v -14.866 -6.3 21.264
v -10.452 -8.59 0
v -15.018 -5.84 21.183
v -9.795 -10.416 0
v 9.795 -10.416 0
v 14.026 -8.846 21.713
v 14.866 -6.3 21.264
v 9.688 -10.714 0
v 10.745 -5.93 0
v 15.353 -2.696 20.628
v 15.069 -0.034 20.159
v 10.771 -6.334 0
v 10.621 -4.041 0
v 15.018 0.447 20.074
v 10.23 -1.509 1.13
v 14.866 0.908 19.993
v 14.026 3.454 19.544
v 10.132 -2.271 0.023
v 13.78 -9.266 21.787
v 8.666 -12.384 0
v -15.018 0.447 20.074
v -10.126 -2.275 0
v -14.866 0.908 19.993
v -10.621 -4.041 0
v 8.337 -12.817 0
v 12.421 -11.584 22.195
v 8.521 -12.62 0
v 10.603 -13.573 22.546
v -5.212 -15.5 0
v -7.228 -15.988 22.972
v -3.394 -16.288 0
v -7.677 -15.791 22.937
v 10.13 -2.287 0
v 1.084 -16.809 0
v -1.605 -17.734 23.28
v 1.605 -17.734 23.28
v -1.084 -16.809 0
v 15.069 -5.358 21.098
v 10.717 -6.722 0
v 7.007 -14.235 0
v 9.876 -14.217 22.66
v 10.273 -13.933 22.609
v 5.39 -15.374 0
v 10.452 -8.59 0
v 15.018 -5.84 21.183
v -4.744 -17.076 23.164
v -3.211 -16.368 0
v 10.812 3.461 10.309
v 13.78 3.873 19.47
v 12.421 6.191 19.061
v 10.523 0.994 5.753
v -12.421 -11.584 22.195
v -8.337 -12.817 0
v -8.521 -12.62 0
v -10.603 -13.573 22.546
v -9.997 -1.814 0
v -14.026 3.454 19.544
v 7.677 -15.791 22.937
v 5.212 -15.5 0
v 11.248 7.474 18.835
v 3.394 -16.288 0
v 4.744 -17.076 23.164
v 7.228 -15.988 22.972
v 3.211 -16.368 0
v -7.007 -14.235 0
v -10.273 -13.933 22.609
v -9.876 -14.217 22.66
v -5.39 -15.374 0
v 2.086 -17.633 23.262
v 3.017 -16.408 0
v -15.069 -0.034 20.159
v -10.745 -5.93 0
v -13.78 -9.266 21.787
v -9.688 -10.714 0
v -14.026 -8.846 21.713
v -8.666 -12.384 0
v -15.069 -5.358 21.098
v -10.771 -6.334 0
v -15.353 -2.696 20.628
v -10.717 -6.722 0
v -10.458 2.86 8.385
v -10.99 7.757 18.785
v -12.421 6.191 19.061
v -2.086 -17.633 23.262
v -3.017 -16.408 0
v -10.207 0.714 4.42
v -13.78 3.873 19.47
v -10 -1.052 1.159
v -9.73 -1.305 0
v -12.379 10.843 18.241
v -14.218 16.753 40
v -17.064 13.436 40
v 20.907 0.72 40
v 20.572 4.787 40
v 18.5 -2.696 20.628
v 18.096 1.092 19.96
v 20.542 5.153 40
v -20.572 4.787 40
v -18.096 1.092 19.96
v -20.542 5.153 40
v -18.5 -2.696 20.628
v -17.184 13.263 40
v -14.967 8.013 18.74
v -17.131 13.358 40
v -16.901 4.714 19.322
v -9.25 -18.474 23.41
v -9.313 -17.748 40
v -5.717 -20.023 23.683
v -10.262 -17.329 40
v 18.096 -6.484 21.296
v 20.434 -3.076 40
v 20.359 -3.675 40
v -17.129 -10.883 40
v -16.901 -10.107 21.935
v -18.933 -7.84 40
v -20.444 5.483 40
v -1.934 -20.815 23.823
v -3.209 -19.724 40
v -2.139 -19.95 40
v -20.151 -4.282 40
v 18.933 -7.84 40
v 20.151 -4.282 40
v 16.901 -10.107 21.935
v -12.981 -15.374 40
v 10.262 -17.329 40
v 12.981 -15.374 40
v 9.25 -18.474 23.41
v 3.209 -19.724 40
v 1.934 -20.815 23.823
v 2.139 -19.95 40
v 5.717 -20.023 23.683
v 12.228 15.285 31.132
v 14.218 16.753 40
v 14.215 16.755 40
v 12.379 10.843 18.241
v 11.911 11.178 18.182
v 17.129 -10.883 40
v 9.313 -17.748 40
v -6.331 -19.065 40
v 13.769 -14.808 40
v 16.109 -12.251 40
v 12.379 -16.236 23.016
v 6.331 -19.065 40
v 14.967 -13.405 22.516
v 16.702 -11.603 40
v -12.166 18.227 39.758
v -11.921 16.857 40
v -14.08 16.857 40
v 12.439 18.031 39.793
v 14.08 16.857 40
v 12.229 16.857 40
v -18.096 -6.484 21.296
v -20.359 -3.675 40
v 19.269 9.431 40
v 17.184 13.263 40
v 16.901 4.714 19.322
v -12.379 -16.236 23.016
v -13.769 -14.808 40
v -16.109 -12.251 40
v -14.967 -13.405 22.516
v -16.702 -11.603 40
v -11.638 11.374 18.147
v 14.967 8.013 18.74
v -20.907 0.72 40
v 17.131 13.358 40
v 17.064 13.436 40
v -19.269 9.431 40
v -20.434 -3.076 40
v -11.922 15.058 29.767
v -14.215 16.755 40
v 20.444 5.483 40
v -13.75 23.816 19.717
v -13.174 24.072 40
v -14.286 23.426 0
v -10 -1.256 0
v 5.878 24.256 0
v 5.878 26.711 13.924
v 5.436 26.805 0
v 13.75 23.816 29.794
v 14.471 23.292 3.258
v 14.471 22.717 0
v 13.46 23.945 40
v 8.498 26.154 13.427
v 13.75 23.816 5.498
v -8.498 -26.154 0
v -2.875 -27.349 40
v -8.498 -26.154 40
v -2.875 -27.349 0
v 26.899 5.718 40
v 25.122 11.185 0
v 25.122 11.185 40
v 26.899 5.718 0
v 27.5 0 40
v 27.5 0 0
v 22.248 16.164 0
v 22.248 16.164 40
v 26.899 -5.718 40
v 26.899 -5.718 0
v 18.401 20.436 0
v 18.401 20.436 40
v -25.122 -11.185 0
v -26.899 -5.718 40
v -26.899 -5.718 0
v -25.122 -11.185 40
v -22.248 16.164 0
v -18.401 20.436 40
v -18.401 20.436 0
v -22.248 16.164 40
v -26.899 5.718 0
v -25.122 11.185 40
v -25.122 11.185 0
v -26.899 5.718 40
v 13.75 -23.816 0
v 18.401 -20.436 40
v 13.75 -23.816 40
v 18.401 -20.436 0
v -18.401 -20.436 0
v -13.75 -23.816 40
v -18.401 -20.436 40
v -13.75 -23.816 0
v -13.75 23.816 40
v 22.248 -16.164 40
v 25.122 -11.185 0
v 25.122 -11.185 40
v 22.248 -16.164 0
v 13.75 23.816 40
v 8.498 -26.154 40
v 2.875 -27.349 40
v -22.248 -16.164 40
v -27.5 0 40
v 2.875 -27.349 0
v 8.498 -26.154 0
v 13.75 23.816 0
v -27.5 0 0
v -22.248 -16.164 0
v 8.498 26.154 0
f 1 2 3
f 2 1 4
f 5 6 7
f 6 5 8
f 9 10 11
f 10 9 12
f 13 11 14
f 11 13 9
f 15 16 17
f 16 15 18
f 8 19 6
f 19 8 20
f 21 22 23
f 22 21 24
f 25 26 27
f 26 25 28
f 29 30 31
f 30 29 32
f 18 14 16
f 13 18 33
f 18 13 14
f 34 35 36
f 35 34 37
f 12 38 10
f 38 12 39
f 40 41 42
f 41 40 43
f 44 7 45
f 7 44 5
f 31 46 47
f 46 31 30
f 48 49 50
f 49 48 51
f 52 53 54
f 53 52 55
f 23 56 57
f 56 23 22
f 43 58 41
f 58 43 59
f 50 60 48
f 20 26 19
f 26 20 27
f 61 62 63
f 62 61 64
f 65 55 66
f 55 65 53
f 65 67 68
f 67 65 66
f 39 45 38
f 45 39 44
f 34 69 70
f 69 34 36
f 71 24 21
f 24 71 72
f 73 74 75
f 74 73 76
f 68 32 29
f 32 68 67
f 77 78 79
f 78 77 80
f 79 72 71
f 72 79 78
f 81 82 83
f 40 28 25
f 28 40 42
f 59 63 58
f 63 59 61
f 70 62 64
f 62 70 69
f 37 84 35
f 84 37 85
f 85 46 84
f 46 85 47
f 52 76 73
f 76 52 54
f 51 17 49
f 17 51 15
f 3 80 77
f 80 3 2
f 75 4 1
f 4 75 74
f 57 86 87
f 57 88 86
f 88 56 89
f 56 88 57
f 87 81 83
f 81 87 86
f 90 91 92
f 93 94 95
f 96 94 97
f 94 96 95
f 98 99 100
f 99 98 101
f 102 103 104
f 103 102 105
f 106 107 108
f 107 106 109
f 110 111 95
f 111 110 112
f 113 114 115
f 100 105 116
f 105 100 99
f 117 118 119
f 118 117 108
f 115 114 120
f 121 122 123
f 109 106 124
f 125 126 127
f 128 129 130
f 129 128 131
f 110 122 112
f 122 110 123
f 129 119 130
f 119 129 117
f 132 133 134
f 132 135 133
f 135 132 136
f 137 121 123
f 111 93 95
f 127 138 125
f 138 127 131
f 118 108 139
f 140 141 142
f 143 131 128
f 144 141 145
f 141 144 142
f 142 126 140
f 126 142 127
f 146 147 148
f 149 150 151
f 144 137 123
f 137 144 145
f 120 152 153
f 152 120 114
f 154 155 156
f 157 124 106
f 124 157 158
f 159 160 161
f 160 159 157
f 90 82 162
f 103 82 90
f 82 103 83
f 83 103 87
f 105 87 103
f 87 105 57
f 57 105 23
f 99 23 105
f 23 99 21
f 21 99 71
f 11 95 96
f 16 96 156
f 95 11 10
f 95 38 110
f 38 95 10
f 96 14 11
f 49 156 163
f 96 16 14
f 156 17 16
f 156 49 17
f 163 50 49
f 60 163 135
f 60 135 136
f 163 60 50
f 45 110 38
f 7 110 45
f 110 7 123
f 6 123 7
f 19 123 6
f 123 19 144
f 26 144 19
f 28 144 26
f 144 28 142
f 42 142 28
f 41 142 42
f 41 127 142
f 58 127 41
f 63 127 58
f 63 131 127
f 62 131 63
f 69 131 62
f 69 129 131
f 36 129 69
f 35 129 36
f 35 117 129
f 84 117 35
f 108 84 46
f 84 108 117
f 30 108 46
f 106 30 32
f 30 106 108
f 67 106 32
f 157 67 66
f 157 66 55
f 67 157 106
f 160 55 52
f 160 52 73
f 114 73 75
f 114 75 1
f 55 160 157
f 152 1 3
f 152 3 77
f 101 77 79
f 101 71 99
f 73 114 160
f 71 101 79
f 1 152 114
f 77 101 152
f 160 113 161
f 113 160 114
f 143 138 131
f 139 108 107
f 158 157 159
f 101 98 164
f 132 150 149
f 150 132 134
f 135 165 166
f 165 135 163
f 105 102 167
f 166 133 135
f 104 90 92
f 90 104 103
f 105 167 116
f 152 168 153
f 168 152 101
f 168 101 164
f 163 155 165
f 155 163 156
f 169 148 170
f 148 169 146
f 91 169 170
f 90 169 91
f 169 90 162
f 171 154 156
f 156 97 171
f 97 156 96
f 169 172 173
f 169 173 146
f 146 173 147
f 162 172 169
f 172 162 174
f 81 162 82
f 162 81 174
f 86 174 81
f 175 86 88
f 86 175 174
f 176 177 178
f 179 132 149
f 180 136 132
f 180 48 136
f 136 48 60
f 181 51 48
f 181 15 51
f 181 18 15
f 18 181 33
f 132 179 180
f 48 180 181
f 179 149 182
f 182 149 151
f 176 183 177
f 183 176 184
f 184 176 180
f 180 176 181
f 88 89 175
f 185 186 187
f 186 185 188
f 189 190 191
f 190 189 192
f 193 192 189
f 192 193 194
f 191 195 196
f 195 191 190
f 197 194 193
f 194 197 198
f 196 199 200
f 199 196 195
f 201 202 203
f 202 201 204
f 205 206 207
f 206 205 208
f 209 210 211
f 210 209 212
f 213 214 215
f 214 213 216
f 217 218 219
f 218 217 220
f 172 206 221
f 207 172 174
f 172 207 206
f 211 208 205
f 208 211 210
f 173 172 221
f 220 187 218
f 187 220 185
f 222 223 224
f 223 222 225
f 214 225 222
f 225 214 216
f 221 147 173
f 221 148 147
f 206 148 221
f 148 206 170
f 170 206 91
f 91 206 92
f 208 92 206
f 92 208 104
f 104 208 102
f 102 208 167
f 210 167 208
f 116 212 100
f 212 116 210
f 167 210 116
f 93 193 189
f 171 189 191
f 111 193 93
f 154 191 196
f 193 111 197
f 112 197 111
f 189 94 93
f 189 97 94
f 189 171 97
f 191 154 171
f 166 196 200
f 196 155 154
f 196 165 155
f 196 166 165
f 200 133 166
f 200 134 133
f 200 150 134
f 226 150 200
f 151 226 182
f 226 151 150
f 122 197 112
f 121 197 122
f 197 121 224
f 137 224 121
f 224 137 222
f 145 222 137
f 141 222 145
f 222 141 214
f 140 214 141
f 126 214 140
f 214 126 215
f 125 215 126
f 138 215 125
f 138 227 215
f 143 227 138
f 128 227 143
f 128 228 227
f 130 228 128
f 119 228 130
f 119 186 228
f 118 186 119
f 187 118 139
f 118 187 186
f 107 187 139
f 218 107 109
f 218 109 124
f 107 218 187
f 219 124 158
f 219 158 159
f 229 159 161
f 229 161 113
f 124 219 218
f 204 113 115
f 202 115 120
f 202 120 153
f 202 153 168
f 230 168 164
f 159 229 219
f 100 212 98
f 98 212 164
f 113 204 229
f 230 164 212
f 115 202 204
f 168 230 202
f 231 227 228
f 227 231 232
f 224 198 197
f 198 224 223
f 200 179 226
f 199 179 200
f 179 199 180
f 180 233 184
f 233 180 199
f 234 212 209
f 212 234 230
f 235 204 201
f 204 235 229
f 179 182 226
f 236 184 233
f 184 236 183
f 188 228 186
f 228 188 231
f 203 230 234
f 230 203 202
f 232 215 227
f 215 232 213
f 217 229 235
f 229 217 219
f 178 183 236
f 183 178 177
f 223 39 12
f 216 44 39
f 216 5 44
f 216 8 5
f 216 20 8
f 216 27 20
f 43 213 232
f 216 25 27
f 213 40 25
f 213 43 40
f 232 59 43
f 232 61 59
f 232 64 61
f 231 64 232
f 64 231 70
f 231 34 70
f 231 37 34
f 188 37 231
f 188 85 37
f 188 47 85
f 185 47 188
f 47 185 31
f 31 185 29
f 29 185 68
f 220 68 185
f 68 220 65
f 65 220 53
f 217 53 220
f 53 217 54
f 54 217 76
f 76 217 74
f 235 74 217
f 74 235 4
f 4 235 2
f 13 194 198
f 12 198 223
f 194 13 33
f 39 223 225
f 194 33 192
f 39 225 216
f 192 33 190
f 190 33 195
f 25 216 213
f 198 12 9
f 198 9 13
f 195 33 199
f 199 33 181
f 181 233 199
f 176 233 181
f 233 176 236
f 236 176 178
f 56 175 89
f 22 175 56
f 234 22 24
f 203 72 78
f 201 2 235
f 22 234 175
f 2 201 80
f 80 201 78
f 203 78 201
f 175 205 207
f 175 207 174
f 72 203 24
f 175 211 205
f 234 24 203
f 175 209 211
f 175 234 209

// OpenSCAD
epsilon = 0.01; epsilo2 = epsilon*2;

base_width = 60;
base_length = 90;
base_height = 4;
neck_width = 25;  // neck is the 'centre' of the narrowing up to the holder
neck_length = 40;
neck_height = 20;



neck_rad = (neck_height - base_height);
neck_wid_off = (base_width - neck_width) / 2 - neck_rad;
neck_wid_fof = base_width - neck_wid_off;
neck_len_off = (base_length - neck_length) / 2 - neck_rad;
neck_len_fof = base_length - neck_len_off;
echo("neck_rad", neck_rad, "neck_wid_off", neck_wid_off);

* difference() {
    union() {
        // the base, up to the centre neck
        cube([base_width, base_length, neck_height]);
        translate([(base_width-neck_width)/2, -5, 0]) cube([neck_width, 1, 1]);
    }
    union() {
        translate([neck_wid_off, -epsilon, neck_height]) 
          rotate([-90, 0, 0]) cylinder(h=base_length + epsilo2, r=neck_rad);
        translate([neck_wid_fof, -epsilon, neck_height]) 
          rotate([-90, 0, 0]) cylinder(h=base_length + epsilo2, r=neck_rad);
        if (neck_wid_off>0) { union() {
            translate([-epsilon, -epsilon, base_height])
              cube([neck_wid_off, base_length + epsilo2, neck_rad]); 
            translate([neck_wid_fof, -epsilon, base_height])
              cube([neck_wid_off+epsilon, base_length + epsilo2, neck_rad]); 
        } }
        translate([-epsilon, neck_len_off, neck_height])
          rotate([0, 90, 0]) cylinder(h=base_width + epsilo2, r=neck_rad);
        translate([-epsilon, neck_len_fof, neck_height])
          rotate([0, 90, 0]) cylinder(h=base_width + epsilo2, r=neck_rad);
        if (neck_len_off>0) { union() {
            translate([-epsilon, -epsilon, base_height])
              cube([base_width + epsilo2, neck_len_off, neck_rad]); 
            translate([-epsilon, neck_len_fof, base_height])
              cube([base_width + epsilo2, neck_len_off+epsilon, neck_rad]); 
        } }
    }
}

holder_outer_bot_d = 55;
holder_outer_top_d = 55;
holder_height = 40;
holder_inner1_bot_d = 20; holder_inner1_bot_r = holder_inner1_bot_d/2;
holder_inner1_top_d = 34;
holder_inner1_height= 32;
holder_inner2_bot_d = 37;
holder_inner2_top_d = 42.5;
holder_inner2_height= 19;
holder_inner_angle = 10;
holder_inner_z_off = holder_height*sin(holder_inner_angle);
holder_inner_epsilon = holder_inner1_bot_d*sin(holder_inner_angle);
holder_throat_1_angle = 10;  // based as an offset from holder_inner1_bot_d;
holder_throat_2_angle = 15;
holder_throat_2_offset = 10;

difference() {
    cylinder(h=holder_height, d1=holder_outer_bot_d, d2=holder_outer_top_d);
    translate([0, -holder_inner_z_off, -holder_inner_epsilon]) 
      rotate([-holder_inner_angle, 0, 0]) union() {
        // The cones to make up the holder
        translate([0, 0, 0]) cylinder(
          h=holder_inner1_height, d1=holder_inner1_bot_d, d2=holder_inner1_top_d
        );
        translate([0, 0, holder_height-holder_inner2_height+holder_inner_epsilon]) cylinder(
          h=holder_inner2_height+holder_inner_epsilon, d1=holder_inner2_bot_d, 
          d2=holder_inner2_top_d
        );
        // The throat wedges
        translate([-holder_inner1_bot_r, holder_inner1_bot_r/2, 0])
          rotate([0, 0, holder_throat_1_angle]) translate([0, 0, 0]) cube([
            holder_inner1_bot_d, holder_outer_top_d/2, holder_height+holder_inner_z_off*2
          ]);
        # translate([-holder_inner1_bot_r, holder_inner1_bot_r/2, 0])
          rotate([0, 0, -holder_throat_1_angle]) translate([0, 0, 0]) cube([
            holder_inner1_bot_d, holder_outer_top_d/2, holder_height+holder_inner_z_off*2
          ]);
    };
}
